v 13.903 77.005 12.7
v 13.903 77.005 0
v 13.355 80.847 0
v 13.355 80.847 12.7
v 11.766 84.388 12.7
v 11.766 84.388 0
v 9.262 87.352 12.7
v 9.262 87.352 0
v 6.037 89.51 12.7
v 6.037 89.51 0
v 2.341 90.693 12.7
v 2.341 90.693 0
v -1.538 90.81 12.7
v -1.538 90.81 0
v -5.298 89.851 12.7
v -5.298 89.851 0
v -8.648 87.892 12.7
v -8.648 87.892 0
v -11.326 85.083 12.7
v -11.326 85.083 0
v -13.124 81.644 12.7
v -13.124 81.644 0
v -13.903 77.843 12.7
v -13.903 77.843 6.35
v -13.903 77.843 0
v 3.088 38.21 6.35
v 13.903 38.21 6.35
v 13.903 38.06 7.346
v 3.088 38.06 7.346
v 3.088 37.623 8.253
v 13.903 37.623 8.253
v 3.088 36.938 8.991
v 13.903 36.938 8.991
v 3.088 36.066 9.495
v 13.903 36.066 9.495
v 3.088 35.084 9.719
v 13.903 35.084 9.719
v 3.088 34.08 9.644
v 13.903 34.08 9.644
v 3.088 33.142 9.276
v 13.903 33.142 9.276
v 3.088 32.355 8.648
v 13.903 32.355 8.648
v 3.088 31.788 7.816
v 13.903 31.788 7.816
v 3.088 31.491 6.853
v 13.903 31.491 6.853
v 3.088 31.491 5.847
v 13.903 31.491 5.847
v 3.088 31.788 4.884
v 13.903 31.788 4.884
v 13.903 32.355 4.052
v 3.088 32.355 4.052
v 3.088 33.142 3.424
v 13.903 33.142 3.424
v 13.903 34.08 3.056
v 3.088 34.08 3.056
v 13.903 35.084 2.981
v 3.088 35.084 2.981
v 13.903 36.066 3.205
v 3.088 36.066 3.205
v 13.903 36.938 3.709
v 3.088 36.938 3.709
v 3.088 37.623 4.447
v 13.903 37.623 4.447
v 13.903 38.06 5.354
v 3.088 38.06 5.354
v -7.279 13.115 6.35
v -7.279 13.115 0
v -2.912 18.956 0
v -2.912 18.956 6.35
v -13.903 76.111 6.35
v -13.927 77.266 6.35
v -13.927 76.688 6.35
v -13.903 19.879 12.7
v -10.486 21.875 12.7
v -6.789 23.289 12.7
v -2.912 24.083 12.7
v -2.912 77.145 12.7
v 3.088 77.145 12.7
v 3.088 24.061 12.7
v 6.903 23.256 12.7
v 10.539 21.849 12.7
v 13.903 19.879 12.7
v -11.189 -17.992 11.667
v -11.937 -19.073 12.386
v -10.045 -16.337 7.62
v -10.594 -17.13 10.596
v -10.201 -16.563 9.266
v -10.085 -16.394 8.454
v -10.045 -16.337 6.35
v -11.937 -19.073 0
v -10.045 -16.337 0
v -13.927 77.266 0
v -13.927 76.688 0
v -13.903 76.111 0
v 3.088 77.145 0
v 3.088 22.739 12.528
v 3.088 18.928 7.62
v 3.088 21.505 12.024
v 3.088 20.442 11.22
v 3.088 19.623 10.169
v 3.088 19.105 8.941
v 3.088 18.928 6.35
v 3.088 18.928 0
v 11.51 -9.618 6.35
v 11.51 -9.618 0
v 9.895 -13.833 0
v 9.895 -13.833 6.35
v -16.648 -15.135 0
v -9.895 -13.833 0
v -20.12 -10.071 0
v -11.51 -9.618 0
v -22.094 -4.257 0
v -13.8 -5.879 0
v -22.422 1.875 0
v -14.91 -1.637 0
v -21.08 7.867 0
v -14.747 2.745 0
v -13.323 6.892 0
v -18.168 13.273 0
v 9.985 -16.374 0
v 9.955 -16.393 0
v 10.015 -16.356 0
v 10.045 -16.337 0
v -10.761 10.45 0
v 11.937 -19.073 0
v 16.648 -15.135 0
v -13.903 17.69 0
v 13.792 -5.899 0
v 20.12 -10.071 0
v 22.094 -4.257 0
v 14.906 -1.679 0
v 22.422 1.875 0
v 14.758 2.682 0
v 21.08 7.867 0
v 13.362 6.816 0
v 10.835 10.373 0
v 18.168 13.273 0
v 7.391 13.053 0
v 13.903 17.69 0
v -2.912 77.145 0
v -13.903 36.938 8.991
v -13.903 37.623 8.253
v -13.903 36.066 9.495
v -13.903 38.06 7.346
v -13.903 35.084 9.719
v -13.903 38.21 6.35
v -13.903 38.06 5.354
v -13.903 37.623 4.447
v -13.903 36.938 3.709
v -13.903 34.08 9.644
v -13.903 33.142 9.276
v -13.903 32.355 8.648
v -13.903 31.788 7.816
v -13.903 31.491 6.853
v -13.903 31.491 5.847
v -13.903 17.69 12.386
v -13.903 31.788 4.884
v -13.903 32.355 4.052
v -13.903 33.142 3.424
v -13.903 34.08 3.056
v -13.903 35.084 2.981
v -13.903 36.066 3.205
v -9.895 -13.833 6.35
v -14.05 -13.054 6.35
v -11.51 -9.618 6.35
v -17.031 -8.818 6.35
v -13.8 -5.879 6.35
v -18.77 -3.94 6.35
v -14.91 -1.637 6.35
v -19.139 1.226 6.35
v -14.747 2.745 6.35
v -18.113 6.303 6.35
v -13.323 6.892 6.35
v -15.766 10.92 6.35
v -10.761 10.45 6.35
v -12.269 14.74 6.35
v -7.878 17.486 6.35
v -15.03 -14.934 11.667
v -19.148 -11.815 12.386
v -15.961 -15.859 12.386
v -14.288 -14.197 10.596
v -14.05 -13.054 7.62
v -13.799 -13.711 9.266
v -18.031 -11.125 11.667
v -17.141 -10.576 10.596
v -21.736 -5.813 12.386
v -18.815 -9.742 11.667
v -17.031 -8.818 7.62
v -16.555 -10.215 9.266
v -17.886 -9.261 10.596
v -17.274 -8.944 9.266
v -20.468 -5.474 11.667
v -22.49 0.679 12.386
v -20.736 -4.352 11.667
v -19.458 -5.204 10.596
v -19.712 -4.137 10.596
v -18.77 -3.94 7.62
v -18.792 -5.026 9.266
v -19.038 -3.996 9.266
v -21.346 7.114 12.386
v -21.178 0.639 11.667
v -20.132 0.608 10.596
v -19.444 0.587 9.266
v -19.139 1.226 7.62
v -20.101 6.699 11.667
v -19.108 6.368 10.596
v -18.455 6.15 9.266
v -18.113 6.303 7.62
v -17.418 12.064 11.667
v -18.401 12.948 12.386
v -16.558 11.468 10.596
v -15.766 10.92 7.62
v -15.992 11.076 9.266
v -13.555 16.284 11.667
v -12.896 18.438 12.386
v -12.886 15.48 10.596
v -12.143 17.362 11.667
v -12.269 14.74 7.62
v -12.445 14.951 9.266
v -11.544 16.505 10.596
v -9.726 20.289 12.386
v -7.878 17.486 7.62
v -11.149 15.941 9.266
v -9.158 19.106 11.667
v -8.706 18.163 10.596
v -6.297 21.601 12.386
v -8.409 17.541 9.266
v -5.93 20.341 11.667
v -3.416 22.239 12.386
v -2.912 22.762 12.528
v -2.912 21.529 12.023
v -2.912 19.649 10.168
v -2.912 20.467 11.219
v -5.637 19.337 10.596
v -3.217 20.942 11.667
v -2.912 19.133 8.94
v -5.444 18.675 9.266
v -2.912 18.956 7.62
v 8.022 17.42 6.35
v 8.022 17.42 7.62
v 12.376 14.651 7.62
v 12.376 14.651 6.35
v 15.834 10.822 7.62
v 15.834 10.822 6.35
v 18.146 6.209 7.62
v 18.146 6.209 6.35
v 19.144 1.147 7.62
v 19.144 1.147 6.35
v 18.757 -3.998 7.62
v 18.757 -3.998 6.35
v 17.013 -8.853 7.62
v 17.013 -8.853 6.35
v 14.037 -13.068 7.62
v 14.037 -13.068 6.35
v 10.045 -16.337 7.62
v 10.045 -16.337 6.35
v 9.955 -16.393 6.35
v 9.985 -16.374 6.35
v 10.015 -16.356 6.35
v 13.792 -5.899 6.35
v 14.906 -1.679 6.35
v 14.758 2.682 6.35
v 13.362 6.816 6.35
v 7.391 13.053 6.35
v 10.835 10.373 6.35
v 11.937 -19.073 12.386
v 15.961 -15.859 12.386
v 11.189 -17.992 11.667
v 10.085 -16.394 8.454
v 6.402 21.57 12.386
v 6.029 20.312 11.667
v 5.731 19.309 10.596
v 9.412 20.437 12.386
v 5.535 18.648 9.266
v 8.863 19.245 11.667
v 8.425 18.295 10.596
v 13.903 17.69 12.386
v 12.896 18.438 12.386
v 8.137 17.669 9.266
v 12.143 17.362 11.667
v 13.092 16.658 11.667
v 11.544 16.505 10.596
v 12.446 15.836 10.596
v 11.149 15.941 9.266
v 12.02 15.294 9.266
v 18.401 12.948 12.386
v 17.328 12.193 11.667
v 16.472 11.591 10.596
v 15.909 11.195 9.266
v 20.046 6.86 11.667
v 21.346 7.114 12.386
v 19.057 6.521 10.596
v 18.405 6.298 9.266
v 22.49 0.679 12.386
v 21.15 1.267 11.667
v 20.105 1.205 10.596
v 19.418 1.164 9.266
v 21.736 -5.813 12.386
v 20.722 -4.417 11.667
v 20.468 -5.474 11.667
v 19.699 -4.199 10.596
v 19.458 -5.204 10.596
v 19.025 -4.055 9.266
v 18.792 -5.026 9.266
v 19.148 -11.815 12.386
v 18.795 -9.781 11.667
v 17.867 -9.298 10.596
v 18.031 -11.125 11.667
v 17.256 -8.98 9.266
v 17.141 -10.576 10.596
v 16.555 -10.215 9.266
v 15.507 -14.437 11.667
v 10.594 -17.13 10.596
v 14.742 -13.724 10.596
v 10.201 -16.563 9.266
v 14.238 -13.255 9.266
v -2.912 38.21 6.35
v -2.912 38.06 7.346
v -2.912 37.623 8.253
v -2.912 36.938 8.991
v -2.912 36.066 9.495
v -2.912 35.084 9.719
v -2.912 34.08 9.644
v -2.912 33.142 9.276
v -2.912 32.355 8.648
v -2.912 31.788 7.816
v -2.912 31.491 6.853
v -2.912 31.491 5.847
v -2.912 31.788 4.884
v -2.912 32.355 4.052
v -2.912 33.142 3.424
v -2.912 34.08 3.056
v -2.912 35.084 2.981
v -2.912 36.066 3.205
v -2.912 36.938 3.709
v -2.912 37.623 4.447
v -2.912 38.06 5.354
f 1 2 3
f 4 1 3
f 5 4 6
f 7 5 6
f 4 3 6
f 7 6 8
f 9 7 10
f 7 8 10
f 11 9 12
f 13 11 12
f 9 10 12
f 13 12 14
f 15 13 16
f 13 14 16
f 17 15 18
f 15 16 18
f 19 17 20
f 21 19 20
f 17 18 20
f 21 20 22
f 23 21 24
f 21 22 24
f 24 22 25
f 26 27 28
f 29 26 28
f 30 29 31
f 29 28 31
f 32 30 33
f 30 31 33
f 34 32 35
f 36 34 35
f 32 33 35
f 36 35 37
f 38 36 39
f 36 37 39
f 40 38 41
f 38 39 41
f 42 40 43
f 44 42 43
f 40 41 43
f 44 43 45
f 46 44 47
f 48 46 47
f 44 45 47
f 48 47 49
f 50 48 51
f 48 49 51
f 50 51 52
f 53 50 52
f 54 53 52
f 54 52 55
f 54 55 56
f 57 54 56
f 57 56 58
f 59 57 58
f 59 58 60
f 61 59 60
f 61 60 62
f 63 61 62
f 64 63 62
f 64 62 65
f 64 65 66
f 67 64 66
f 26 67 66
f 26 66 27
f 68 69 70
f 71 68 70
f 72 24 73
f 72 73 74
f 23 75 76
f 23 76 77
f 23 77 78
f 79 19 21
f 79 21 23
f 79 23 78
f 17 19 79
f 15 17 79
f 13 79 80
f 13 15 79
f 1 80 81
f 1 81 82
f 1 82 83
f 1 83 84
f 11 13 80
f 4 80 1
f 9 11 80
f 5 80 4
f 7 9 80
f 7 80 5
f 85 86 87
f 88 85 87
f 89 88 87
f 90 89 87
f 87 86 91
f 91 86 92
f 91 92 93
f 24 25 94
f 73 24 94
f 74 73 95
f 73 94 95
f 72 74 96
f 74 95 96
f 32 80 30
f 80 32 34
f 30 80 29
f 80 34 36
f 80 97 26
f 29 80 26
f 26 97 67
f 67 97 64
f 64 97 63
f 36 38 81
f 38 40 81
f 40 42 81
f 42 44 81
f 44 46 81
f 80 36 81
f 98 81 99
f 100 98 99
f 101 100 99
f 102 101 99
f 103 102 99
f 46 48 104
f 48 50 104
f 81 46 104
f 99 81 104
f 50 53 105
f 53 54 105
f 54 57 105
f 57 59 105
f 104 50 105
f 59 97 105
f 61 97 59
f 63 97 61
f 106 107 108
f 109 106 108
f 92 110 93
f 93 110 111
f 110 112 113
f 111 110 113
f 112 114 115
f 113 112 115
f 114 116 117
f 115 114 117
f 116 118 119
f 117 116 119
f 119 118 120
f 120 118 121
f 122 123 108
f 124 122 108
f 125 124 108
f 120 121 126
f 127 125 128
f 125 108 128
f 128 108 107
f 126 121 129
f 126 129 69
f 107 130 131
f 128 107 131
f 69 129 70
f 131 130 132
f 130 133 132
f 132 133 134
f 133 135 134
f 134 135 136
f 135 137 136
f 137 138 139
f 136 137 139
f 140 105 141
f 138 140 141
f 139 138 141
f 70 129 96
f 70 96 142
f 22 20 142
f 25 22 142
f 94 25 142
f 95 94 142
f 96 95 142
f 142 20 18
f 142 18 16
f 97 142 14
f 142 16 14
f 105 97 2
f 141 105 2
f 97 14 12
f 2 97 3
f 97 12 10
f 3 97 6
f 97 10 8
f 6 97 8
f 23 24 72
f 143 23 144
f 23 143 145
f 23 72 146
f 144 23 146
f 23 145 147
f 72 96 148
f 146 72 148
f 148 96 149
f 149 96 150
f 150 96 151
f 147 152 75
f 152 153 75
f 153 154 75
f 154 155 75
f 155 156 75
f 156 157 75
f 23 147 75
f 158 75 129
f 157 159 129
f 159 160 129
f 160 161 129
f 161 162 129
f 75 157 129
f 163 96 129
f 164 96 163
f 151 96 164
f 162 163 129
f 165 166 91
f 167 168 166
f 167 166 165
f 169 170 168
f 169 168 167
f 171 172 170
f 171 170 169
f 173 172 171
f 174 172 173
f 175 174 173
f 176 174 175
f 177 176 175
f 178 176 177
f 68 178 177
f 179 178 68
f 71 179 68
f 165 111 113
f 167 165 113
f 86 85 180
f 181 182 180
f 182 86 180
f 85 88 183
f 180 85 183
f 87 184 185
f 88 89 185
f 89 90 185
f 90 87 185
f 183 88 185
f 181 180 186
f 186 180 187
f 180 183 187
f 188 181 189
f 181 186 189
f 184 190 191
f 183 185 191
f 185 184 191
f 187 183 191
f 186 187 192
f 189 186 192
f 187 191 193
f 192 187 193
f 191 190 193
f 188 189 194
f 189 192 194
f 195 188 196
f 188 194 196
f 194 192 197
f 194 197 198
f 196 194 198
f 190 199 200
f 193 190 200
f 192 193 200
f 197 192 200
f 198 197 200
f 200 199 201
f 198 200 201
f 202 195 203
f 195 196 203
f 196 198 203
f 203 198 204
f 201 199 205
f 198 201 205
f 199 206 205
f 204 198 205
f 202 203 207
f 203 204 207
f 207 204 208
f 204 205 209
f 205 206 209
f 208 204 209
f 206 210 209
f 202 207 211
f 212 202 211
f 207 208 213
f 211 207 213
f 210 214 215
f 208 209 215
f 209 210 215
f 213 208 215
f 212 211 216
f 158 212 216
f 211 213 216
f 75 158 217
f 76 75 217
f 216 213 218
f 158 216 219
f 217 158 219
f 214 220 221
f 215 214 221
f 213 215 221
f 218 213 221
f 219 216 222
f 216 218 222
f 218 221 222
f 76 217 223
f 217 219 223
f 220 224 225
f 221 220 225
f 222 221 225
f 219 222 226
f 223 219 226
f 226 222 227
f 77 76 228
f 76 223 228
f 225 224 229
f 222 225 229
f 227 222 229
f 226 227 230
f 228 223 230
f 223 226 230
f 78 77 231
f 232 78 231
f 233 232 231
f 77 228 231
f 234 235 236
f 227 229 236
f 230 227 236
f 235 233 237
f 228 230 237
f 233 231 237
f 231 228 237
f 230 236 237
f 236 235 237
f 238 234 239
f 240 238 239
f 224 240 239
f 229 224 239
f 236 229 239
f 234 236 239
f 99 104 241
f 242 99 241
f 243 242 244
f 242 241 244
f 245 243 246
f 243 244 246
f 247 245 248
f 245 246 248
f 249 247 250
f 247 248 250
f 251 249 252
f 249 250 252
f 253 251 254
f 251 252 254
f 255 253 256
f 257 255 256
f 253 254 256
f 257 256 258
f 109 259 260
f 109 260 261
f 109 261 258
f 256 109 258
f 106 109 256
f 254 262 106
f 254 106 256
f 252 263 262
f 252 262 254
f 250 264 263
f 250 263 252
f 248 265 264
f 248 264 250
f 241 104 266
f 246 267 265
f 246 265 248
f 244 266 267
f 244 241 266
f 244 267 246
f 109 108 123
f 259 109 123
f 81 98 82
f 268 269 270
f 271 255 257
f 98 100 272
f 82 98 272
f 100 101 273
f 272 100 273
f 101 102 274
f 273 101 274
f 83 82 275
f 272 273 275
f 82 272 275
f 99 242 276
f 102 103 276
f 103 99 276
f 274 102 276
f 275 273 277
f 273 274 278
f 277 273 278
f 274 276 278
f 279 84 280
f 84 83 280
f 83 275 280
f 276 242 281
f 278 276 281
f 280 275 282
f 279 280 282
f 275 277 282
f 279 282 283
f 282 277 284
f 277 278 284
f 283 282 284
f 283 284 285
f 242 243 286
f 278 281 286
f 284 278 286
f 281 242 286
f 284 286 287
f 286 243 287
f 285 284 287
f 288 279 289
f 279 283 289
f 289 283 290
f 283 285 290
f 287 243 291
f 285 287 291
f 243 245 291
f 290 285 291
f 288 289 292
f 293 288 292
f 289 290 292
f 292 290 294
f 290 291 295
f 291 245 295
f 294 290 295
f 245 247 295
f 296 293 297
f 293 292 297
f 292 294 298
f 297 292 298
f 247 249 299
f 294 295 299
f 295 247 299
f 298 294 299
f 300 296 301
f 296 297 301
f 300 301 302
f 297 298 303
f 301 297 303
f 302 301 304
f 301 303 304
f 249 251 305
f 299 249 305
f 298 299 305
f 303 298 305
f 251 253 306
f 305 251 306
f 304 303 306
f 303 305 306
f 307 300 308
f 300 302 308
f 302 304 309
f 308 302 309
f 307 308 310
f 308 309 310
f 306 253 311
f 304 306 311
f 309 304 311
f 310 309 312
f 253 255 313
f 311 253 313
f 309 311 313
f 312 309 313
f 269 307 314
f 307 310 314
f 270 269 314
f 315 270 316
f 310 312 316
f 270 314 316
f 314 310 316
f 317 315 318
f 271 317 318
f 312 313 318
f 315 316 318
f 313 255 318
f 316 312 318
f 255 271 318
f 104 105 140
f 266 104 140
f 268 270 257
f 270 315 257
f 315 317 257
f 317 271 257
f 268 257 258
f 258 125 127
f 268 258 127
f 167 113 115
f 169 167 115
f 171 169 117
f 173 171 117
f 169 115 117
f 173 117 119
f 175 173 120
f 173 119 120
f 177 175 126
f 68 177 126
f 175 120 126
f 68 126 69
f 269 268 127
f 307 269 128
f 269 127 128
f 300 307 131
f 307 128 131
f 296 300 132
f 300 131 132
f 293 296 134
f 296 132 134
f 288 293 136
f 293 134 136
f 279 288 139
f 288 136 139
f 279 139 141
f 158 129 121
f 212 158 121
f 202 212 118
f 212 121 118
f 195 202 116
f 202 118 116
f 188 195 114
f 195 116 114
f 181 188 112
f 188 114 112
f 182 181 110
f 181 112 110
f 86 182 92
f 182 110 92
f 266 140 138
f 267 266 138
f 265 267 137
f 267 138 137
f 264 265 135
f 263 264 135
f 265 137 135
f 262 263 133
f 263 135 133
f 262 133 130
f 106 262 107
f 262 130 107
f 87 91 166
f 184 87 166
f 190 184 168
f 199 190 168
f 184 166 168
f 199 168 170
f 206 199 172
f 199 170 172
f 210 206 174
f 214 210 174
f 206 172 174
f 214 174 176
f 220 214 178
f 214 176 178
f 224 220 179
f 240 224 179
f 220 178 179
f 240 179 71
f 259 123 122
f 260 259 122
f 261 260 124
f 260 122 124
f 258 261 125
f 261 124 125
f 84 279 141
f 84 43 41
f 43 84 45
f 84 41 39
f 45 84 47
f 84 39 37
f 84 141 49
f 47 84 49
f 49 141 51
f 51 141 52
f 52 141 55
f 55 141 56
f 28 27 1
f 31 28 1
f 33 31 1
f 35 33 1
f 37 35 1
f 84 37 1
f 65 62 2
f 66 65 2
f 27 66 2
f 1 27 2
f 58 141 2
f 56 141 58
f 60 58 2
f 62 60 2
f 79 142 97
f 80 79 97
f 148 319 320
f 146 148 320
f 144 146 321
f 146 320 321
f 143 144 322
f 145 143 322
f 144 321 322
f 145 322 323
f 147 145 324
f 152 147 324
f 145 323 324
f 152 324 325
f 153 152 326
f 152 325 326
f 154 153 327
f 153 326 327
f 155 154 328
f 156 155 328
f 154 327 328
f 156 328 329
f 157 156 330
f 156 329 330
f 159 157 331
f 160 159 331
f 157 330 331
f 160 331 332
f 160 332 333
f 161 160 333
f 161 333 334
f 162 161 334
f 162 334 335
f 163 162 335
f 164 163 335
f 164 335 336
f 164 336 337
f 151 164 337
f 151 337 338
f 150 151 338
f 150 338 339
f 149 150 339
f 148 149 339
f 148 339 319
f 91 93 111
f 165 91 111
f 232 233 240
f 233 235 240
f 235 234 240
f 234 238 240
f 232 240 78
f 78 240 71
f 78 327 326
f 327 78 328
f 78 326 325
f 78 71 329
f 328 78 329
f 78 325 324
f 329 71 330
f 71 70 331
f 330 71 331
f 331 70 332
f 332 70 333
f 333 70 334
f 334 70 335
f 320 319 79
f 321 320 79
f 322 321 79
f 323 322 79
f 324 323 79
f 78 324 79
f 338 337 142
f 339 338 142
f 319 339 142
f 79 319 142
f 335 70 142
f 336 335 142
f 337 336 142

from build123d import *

# Parameters (mm, degrees)
F1_DEPTH = 12.7
F2_DEPTH = 6.35
F4_D     = 6.7564
F5_R     = 5.08


with BuildPart() as f1:
    # F0 (on Top) → F1 (new body)
    with BuildSketch(Plane.XY):
        with BuildLine():
            Line((-13.9034517987, 76.1113017797), (-13.9034517987, 17.6902240822))
            ThreePointArc((-13.9034517987, 17.6902240822), (-22.46786683, -1.2020649347), (-11.9365793678, -19.0727049208))
            Line((-11.9365793678, -19.0727049208), (-10.045198296, -16.337374341))
            ThreePointArc((-10.045198296, -16.337374341), (-18.7984085357, 3.7994270212), (-2.9118661168, 18.9561822338))
            Line((-2.9118661168, 18.9561822338), (-2.9118661168, 77.1448761225))
            Line((-2.9118661168, 77.1448761225), (3.0881338832, 77.1448761225))
            Line((3.0881338832, 77.1448761225), (3.0881338832, 18.928265591))
            ThreePointArc((3.0881338832, 18.928265591), (18.8158827453, 3.7119221002), (10.045198296, -16.337374341))
            Line((10.045198296, -16.337374341), (11.9365793678, -19.0727049208))
            ThreePointArc((11.9365793678, -19.0727049208), (22.46786683, -1.2020649347), (13.9034517987, 17.6902240822))
            Line((13.9034517987, 17.6902240822), (13.9034517987, 76.9488066435))
            Line((13.9034517987, 76.9488066435), (13.9034517987, 77.005261239))
            ThreePointArc((13.9034517987, 77.005261239), (0.4055063748, 90.8876688225), (-13.9034517987, 77.8427661028))
            Line((-13.9034517987, 77.8427661028), (-13.9034517987, 76.1113017797))
        make_face()
    extrude(amount=F1_DEPTH)

    # F0 (on Top) → F2 (join)
    with BuildSketch(Plane.XY):
        with BuildLine():
            Line((-13.9034517987, 76.1113017797), (-13.9034517987, 17.6902240822))
            ThreePointArc((-13.9034517987, 17.6902240822), (-22.46786683, -1.2020649347), (-11.9365793678, -19.0727049208))
            Line((-11.9365793678, -19.0727049208), (-10.045198296, -16.337374341))
            ThreePointArc((-10.045198296, -16.337374341), (-18.7984085357, 3.7994270212), (-2.9118661168, 18.9561822338))
            Line((-2.9118661168, 18.9561822338), (-2.9118661168, 77.1448761225))
            Line((-2.9118661168, 77.1448761225), (3.0881338832, 77.1448761225))
            Line((3.0881338832, 77.1448761225), (3.0881338832, 18.928265591))
            ThreePointArc((3.0881338832, 18.928265591), (18.8158827453, 3.7119221002), (10.045198296, -16.337374341))
            Line((10.045198296, -16.337374341), (11.9365793678, -19.0727049208))
            ThreePointArc((11.9365793678, -19.0727049208), (22.46786683, -1.2020649347), (13.9034517987, 17.6902240822))
            Line((13.9034517987, 17.6902240822), (13.9034517987, 76.9488066435))
            Line((13.9034517987, 76.9488066435), (13.9034517987, 77.005261239))
            ThreePointArc((13.9034517987, 77.005261239), (0.4055063748, 90.8876688225), (-13.9034517987, 77.8427661028))
            Line((-13.9034517987, 77.8427661028), (-13.9034517987, 76.1113017797))
        make_face()
        with BuildLine():
            ThreePointArc((-13.9034517987, 77.8427661028), (-13.9304052278, 76.9770339413), (-13.9034517987, 76.1113017797))
            Line((-13.9034517987, 76.1113017797), (-13.9034517987, 77.8427661028))
        make_face()
        with BuildLine():
            ThreePointArc((-2.9118661168, 18.9561822338), (-18.7984085357, 3.7994270212), (-10.045198296, -16.337374341))
            Line((-10.045198296, -16.337374341), (-9.8947915389, -13.8333481617))
            Line((-9.8947915389, -13.8333481617), (-11.5102852396, -9.6183851921))
            ThreePointArc((-11.5102852396, -9.6183851921), (-14.7467682956, 2.7445992121), (-7.2791813889, 13.1153924191))
            Line((-7.2791813889, 13.1153924191), (-2.9118661168, 18.9561822338))
        make_face()
        with BuildLine():
            ThreePointArc((10.045198296, -16.337374341), (18.8158827453, 3.7119221002), (3.0881338832, 18.928265591))
            Line((3.0881338832, 18.928265591), (7.3907075504, 13.0528710215))
            ThreePointArc((7.3907075504, 13.0528710215), (14.758331433, 2.6817258086), (11.5102852396, -9.6183851921))
            Line((11.5102852396, -9.6183851921), (9.8947915389, -13.8333481617))
            Line((9.8947915389, -13.8333481617), (9.9547252954, -16.3926585232))
            ThreePointArc((9.9547252954, -16.3926585232), (10, -16.3650789538), (10.045198296, -16.337374341))
        make_face()
    extrude(amount=F2_DEPTH)

    # F4 (through all)
    with Locations(Plane(origin=(-13.9034517987, 0, 0), x_dir=(0, -1, 0), z_dir=(-1, 0, 0))):
        with Locations((-34.83145684, 6.35)):
            Hole(F4_D / 2)

    # F5
    f5_edges = [f1.edges().sort_by_distance(p)[0] for p in [
        (-18.798409, 3.799427, 12.7),
        (18.815883, 3.711922, 12.7),
    ]]
    fillet(f5_edges, radius=F5_R)


solid = f1.part
